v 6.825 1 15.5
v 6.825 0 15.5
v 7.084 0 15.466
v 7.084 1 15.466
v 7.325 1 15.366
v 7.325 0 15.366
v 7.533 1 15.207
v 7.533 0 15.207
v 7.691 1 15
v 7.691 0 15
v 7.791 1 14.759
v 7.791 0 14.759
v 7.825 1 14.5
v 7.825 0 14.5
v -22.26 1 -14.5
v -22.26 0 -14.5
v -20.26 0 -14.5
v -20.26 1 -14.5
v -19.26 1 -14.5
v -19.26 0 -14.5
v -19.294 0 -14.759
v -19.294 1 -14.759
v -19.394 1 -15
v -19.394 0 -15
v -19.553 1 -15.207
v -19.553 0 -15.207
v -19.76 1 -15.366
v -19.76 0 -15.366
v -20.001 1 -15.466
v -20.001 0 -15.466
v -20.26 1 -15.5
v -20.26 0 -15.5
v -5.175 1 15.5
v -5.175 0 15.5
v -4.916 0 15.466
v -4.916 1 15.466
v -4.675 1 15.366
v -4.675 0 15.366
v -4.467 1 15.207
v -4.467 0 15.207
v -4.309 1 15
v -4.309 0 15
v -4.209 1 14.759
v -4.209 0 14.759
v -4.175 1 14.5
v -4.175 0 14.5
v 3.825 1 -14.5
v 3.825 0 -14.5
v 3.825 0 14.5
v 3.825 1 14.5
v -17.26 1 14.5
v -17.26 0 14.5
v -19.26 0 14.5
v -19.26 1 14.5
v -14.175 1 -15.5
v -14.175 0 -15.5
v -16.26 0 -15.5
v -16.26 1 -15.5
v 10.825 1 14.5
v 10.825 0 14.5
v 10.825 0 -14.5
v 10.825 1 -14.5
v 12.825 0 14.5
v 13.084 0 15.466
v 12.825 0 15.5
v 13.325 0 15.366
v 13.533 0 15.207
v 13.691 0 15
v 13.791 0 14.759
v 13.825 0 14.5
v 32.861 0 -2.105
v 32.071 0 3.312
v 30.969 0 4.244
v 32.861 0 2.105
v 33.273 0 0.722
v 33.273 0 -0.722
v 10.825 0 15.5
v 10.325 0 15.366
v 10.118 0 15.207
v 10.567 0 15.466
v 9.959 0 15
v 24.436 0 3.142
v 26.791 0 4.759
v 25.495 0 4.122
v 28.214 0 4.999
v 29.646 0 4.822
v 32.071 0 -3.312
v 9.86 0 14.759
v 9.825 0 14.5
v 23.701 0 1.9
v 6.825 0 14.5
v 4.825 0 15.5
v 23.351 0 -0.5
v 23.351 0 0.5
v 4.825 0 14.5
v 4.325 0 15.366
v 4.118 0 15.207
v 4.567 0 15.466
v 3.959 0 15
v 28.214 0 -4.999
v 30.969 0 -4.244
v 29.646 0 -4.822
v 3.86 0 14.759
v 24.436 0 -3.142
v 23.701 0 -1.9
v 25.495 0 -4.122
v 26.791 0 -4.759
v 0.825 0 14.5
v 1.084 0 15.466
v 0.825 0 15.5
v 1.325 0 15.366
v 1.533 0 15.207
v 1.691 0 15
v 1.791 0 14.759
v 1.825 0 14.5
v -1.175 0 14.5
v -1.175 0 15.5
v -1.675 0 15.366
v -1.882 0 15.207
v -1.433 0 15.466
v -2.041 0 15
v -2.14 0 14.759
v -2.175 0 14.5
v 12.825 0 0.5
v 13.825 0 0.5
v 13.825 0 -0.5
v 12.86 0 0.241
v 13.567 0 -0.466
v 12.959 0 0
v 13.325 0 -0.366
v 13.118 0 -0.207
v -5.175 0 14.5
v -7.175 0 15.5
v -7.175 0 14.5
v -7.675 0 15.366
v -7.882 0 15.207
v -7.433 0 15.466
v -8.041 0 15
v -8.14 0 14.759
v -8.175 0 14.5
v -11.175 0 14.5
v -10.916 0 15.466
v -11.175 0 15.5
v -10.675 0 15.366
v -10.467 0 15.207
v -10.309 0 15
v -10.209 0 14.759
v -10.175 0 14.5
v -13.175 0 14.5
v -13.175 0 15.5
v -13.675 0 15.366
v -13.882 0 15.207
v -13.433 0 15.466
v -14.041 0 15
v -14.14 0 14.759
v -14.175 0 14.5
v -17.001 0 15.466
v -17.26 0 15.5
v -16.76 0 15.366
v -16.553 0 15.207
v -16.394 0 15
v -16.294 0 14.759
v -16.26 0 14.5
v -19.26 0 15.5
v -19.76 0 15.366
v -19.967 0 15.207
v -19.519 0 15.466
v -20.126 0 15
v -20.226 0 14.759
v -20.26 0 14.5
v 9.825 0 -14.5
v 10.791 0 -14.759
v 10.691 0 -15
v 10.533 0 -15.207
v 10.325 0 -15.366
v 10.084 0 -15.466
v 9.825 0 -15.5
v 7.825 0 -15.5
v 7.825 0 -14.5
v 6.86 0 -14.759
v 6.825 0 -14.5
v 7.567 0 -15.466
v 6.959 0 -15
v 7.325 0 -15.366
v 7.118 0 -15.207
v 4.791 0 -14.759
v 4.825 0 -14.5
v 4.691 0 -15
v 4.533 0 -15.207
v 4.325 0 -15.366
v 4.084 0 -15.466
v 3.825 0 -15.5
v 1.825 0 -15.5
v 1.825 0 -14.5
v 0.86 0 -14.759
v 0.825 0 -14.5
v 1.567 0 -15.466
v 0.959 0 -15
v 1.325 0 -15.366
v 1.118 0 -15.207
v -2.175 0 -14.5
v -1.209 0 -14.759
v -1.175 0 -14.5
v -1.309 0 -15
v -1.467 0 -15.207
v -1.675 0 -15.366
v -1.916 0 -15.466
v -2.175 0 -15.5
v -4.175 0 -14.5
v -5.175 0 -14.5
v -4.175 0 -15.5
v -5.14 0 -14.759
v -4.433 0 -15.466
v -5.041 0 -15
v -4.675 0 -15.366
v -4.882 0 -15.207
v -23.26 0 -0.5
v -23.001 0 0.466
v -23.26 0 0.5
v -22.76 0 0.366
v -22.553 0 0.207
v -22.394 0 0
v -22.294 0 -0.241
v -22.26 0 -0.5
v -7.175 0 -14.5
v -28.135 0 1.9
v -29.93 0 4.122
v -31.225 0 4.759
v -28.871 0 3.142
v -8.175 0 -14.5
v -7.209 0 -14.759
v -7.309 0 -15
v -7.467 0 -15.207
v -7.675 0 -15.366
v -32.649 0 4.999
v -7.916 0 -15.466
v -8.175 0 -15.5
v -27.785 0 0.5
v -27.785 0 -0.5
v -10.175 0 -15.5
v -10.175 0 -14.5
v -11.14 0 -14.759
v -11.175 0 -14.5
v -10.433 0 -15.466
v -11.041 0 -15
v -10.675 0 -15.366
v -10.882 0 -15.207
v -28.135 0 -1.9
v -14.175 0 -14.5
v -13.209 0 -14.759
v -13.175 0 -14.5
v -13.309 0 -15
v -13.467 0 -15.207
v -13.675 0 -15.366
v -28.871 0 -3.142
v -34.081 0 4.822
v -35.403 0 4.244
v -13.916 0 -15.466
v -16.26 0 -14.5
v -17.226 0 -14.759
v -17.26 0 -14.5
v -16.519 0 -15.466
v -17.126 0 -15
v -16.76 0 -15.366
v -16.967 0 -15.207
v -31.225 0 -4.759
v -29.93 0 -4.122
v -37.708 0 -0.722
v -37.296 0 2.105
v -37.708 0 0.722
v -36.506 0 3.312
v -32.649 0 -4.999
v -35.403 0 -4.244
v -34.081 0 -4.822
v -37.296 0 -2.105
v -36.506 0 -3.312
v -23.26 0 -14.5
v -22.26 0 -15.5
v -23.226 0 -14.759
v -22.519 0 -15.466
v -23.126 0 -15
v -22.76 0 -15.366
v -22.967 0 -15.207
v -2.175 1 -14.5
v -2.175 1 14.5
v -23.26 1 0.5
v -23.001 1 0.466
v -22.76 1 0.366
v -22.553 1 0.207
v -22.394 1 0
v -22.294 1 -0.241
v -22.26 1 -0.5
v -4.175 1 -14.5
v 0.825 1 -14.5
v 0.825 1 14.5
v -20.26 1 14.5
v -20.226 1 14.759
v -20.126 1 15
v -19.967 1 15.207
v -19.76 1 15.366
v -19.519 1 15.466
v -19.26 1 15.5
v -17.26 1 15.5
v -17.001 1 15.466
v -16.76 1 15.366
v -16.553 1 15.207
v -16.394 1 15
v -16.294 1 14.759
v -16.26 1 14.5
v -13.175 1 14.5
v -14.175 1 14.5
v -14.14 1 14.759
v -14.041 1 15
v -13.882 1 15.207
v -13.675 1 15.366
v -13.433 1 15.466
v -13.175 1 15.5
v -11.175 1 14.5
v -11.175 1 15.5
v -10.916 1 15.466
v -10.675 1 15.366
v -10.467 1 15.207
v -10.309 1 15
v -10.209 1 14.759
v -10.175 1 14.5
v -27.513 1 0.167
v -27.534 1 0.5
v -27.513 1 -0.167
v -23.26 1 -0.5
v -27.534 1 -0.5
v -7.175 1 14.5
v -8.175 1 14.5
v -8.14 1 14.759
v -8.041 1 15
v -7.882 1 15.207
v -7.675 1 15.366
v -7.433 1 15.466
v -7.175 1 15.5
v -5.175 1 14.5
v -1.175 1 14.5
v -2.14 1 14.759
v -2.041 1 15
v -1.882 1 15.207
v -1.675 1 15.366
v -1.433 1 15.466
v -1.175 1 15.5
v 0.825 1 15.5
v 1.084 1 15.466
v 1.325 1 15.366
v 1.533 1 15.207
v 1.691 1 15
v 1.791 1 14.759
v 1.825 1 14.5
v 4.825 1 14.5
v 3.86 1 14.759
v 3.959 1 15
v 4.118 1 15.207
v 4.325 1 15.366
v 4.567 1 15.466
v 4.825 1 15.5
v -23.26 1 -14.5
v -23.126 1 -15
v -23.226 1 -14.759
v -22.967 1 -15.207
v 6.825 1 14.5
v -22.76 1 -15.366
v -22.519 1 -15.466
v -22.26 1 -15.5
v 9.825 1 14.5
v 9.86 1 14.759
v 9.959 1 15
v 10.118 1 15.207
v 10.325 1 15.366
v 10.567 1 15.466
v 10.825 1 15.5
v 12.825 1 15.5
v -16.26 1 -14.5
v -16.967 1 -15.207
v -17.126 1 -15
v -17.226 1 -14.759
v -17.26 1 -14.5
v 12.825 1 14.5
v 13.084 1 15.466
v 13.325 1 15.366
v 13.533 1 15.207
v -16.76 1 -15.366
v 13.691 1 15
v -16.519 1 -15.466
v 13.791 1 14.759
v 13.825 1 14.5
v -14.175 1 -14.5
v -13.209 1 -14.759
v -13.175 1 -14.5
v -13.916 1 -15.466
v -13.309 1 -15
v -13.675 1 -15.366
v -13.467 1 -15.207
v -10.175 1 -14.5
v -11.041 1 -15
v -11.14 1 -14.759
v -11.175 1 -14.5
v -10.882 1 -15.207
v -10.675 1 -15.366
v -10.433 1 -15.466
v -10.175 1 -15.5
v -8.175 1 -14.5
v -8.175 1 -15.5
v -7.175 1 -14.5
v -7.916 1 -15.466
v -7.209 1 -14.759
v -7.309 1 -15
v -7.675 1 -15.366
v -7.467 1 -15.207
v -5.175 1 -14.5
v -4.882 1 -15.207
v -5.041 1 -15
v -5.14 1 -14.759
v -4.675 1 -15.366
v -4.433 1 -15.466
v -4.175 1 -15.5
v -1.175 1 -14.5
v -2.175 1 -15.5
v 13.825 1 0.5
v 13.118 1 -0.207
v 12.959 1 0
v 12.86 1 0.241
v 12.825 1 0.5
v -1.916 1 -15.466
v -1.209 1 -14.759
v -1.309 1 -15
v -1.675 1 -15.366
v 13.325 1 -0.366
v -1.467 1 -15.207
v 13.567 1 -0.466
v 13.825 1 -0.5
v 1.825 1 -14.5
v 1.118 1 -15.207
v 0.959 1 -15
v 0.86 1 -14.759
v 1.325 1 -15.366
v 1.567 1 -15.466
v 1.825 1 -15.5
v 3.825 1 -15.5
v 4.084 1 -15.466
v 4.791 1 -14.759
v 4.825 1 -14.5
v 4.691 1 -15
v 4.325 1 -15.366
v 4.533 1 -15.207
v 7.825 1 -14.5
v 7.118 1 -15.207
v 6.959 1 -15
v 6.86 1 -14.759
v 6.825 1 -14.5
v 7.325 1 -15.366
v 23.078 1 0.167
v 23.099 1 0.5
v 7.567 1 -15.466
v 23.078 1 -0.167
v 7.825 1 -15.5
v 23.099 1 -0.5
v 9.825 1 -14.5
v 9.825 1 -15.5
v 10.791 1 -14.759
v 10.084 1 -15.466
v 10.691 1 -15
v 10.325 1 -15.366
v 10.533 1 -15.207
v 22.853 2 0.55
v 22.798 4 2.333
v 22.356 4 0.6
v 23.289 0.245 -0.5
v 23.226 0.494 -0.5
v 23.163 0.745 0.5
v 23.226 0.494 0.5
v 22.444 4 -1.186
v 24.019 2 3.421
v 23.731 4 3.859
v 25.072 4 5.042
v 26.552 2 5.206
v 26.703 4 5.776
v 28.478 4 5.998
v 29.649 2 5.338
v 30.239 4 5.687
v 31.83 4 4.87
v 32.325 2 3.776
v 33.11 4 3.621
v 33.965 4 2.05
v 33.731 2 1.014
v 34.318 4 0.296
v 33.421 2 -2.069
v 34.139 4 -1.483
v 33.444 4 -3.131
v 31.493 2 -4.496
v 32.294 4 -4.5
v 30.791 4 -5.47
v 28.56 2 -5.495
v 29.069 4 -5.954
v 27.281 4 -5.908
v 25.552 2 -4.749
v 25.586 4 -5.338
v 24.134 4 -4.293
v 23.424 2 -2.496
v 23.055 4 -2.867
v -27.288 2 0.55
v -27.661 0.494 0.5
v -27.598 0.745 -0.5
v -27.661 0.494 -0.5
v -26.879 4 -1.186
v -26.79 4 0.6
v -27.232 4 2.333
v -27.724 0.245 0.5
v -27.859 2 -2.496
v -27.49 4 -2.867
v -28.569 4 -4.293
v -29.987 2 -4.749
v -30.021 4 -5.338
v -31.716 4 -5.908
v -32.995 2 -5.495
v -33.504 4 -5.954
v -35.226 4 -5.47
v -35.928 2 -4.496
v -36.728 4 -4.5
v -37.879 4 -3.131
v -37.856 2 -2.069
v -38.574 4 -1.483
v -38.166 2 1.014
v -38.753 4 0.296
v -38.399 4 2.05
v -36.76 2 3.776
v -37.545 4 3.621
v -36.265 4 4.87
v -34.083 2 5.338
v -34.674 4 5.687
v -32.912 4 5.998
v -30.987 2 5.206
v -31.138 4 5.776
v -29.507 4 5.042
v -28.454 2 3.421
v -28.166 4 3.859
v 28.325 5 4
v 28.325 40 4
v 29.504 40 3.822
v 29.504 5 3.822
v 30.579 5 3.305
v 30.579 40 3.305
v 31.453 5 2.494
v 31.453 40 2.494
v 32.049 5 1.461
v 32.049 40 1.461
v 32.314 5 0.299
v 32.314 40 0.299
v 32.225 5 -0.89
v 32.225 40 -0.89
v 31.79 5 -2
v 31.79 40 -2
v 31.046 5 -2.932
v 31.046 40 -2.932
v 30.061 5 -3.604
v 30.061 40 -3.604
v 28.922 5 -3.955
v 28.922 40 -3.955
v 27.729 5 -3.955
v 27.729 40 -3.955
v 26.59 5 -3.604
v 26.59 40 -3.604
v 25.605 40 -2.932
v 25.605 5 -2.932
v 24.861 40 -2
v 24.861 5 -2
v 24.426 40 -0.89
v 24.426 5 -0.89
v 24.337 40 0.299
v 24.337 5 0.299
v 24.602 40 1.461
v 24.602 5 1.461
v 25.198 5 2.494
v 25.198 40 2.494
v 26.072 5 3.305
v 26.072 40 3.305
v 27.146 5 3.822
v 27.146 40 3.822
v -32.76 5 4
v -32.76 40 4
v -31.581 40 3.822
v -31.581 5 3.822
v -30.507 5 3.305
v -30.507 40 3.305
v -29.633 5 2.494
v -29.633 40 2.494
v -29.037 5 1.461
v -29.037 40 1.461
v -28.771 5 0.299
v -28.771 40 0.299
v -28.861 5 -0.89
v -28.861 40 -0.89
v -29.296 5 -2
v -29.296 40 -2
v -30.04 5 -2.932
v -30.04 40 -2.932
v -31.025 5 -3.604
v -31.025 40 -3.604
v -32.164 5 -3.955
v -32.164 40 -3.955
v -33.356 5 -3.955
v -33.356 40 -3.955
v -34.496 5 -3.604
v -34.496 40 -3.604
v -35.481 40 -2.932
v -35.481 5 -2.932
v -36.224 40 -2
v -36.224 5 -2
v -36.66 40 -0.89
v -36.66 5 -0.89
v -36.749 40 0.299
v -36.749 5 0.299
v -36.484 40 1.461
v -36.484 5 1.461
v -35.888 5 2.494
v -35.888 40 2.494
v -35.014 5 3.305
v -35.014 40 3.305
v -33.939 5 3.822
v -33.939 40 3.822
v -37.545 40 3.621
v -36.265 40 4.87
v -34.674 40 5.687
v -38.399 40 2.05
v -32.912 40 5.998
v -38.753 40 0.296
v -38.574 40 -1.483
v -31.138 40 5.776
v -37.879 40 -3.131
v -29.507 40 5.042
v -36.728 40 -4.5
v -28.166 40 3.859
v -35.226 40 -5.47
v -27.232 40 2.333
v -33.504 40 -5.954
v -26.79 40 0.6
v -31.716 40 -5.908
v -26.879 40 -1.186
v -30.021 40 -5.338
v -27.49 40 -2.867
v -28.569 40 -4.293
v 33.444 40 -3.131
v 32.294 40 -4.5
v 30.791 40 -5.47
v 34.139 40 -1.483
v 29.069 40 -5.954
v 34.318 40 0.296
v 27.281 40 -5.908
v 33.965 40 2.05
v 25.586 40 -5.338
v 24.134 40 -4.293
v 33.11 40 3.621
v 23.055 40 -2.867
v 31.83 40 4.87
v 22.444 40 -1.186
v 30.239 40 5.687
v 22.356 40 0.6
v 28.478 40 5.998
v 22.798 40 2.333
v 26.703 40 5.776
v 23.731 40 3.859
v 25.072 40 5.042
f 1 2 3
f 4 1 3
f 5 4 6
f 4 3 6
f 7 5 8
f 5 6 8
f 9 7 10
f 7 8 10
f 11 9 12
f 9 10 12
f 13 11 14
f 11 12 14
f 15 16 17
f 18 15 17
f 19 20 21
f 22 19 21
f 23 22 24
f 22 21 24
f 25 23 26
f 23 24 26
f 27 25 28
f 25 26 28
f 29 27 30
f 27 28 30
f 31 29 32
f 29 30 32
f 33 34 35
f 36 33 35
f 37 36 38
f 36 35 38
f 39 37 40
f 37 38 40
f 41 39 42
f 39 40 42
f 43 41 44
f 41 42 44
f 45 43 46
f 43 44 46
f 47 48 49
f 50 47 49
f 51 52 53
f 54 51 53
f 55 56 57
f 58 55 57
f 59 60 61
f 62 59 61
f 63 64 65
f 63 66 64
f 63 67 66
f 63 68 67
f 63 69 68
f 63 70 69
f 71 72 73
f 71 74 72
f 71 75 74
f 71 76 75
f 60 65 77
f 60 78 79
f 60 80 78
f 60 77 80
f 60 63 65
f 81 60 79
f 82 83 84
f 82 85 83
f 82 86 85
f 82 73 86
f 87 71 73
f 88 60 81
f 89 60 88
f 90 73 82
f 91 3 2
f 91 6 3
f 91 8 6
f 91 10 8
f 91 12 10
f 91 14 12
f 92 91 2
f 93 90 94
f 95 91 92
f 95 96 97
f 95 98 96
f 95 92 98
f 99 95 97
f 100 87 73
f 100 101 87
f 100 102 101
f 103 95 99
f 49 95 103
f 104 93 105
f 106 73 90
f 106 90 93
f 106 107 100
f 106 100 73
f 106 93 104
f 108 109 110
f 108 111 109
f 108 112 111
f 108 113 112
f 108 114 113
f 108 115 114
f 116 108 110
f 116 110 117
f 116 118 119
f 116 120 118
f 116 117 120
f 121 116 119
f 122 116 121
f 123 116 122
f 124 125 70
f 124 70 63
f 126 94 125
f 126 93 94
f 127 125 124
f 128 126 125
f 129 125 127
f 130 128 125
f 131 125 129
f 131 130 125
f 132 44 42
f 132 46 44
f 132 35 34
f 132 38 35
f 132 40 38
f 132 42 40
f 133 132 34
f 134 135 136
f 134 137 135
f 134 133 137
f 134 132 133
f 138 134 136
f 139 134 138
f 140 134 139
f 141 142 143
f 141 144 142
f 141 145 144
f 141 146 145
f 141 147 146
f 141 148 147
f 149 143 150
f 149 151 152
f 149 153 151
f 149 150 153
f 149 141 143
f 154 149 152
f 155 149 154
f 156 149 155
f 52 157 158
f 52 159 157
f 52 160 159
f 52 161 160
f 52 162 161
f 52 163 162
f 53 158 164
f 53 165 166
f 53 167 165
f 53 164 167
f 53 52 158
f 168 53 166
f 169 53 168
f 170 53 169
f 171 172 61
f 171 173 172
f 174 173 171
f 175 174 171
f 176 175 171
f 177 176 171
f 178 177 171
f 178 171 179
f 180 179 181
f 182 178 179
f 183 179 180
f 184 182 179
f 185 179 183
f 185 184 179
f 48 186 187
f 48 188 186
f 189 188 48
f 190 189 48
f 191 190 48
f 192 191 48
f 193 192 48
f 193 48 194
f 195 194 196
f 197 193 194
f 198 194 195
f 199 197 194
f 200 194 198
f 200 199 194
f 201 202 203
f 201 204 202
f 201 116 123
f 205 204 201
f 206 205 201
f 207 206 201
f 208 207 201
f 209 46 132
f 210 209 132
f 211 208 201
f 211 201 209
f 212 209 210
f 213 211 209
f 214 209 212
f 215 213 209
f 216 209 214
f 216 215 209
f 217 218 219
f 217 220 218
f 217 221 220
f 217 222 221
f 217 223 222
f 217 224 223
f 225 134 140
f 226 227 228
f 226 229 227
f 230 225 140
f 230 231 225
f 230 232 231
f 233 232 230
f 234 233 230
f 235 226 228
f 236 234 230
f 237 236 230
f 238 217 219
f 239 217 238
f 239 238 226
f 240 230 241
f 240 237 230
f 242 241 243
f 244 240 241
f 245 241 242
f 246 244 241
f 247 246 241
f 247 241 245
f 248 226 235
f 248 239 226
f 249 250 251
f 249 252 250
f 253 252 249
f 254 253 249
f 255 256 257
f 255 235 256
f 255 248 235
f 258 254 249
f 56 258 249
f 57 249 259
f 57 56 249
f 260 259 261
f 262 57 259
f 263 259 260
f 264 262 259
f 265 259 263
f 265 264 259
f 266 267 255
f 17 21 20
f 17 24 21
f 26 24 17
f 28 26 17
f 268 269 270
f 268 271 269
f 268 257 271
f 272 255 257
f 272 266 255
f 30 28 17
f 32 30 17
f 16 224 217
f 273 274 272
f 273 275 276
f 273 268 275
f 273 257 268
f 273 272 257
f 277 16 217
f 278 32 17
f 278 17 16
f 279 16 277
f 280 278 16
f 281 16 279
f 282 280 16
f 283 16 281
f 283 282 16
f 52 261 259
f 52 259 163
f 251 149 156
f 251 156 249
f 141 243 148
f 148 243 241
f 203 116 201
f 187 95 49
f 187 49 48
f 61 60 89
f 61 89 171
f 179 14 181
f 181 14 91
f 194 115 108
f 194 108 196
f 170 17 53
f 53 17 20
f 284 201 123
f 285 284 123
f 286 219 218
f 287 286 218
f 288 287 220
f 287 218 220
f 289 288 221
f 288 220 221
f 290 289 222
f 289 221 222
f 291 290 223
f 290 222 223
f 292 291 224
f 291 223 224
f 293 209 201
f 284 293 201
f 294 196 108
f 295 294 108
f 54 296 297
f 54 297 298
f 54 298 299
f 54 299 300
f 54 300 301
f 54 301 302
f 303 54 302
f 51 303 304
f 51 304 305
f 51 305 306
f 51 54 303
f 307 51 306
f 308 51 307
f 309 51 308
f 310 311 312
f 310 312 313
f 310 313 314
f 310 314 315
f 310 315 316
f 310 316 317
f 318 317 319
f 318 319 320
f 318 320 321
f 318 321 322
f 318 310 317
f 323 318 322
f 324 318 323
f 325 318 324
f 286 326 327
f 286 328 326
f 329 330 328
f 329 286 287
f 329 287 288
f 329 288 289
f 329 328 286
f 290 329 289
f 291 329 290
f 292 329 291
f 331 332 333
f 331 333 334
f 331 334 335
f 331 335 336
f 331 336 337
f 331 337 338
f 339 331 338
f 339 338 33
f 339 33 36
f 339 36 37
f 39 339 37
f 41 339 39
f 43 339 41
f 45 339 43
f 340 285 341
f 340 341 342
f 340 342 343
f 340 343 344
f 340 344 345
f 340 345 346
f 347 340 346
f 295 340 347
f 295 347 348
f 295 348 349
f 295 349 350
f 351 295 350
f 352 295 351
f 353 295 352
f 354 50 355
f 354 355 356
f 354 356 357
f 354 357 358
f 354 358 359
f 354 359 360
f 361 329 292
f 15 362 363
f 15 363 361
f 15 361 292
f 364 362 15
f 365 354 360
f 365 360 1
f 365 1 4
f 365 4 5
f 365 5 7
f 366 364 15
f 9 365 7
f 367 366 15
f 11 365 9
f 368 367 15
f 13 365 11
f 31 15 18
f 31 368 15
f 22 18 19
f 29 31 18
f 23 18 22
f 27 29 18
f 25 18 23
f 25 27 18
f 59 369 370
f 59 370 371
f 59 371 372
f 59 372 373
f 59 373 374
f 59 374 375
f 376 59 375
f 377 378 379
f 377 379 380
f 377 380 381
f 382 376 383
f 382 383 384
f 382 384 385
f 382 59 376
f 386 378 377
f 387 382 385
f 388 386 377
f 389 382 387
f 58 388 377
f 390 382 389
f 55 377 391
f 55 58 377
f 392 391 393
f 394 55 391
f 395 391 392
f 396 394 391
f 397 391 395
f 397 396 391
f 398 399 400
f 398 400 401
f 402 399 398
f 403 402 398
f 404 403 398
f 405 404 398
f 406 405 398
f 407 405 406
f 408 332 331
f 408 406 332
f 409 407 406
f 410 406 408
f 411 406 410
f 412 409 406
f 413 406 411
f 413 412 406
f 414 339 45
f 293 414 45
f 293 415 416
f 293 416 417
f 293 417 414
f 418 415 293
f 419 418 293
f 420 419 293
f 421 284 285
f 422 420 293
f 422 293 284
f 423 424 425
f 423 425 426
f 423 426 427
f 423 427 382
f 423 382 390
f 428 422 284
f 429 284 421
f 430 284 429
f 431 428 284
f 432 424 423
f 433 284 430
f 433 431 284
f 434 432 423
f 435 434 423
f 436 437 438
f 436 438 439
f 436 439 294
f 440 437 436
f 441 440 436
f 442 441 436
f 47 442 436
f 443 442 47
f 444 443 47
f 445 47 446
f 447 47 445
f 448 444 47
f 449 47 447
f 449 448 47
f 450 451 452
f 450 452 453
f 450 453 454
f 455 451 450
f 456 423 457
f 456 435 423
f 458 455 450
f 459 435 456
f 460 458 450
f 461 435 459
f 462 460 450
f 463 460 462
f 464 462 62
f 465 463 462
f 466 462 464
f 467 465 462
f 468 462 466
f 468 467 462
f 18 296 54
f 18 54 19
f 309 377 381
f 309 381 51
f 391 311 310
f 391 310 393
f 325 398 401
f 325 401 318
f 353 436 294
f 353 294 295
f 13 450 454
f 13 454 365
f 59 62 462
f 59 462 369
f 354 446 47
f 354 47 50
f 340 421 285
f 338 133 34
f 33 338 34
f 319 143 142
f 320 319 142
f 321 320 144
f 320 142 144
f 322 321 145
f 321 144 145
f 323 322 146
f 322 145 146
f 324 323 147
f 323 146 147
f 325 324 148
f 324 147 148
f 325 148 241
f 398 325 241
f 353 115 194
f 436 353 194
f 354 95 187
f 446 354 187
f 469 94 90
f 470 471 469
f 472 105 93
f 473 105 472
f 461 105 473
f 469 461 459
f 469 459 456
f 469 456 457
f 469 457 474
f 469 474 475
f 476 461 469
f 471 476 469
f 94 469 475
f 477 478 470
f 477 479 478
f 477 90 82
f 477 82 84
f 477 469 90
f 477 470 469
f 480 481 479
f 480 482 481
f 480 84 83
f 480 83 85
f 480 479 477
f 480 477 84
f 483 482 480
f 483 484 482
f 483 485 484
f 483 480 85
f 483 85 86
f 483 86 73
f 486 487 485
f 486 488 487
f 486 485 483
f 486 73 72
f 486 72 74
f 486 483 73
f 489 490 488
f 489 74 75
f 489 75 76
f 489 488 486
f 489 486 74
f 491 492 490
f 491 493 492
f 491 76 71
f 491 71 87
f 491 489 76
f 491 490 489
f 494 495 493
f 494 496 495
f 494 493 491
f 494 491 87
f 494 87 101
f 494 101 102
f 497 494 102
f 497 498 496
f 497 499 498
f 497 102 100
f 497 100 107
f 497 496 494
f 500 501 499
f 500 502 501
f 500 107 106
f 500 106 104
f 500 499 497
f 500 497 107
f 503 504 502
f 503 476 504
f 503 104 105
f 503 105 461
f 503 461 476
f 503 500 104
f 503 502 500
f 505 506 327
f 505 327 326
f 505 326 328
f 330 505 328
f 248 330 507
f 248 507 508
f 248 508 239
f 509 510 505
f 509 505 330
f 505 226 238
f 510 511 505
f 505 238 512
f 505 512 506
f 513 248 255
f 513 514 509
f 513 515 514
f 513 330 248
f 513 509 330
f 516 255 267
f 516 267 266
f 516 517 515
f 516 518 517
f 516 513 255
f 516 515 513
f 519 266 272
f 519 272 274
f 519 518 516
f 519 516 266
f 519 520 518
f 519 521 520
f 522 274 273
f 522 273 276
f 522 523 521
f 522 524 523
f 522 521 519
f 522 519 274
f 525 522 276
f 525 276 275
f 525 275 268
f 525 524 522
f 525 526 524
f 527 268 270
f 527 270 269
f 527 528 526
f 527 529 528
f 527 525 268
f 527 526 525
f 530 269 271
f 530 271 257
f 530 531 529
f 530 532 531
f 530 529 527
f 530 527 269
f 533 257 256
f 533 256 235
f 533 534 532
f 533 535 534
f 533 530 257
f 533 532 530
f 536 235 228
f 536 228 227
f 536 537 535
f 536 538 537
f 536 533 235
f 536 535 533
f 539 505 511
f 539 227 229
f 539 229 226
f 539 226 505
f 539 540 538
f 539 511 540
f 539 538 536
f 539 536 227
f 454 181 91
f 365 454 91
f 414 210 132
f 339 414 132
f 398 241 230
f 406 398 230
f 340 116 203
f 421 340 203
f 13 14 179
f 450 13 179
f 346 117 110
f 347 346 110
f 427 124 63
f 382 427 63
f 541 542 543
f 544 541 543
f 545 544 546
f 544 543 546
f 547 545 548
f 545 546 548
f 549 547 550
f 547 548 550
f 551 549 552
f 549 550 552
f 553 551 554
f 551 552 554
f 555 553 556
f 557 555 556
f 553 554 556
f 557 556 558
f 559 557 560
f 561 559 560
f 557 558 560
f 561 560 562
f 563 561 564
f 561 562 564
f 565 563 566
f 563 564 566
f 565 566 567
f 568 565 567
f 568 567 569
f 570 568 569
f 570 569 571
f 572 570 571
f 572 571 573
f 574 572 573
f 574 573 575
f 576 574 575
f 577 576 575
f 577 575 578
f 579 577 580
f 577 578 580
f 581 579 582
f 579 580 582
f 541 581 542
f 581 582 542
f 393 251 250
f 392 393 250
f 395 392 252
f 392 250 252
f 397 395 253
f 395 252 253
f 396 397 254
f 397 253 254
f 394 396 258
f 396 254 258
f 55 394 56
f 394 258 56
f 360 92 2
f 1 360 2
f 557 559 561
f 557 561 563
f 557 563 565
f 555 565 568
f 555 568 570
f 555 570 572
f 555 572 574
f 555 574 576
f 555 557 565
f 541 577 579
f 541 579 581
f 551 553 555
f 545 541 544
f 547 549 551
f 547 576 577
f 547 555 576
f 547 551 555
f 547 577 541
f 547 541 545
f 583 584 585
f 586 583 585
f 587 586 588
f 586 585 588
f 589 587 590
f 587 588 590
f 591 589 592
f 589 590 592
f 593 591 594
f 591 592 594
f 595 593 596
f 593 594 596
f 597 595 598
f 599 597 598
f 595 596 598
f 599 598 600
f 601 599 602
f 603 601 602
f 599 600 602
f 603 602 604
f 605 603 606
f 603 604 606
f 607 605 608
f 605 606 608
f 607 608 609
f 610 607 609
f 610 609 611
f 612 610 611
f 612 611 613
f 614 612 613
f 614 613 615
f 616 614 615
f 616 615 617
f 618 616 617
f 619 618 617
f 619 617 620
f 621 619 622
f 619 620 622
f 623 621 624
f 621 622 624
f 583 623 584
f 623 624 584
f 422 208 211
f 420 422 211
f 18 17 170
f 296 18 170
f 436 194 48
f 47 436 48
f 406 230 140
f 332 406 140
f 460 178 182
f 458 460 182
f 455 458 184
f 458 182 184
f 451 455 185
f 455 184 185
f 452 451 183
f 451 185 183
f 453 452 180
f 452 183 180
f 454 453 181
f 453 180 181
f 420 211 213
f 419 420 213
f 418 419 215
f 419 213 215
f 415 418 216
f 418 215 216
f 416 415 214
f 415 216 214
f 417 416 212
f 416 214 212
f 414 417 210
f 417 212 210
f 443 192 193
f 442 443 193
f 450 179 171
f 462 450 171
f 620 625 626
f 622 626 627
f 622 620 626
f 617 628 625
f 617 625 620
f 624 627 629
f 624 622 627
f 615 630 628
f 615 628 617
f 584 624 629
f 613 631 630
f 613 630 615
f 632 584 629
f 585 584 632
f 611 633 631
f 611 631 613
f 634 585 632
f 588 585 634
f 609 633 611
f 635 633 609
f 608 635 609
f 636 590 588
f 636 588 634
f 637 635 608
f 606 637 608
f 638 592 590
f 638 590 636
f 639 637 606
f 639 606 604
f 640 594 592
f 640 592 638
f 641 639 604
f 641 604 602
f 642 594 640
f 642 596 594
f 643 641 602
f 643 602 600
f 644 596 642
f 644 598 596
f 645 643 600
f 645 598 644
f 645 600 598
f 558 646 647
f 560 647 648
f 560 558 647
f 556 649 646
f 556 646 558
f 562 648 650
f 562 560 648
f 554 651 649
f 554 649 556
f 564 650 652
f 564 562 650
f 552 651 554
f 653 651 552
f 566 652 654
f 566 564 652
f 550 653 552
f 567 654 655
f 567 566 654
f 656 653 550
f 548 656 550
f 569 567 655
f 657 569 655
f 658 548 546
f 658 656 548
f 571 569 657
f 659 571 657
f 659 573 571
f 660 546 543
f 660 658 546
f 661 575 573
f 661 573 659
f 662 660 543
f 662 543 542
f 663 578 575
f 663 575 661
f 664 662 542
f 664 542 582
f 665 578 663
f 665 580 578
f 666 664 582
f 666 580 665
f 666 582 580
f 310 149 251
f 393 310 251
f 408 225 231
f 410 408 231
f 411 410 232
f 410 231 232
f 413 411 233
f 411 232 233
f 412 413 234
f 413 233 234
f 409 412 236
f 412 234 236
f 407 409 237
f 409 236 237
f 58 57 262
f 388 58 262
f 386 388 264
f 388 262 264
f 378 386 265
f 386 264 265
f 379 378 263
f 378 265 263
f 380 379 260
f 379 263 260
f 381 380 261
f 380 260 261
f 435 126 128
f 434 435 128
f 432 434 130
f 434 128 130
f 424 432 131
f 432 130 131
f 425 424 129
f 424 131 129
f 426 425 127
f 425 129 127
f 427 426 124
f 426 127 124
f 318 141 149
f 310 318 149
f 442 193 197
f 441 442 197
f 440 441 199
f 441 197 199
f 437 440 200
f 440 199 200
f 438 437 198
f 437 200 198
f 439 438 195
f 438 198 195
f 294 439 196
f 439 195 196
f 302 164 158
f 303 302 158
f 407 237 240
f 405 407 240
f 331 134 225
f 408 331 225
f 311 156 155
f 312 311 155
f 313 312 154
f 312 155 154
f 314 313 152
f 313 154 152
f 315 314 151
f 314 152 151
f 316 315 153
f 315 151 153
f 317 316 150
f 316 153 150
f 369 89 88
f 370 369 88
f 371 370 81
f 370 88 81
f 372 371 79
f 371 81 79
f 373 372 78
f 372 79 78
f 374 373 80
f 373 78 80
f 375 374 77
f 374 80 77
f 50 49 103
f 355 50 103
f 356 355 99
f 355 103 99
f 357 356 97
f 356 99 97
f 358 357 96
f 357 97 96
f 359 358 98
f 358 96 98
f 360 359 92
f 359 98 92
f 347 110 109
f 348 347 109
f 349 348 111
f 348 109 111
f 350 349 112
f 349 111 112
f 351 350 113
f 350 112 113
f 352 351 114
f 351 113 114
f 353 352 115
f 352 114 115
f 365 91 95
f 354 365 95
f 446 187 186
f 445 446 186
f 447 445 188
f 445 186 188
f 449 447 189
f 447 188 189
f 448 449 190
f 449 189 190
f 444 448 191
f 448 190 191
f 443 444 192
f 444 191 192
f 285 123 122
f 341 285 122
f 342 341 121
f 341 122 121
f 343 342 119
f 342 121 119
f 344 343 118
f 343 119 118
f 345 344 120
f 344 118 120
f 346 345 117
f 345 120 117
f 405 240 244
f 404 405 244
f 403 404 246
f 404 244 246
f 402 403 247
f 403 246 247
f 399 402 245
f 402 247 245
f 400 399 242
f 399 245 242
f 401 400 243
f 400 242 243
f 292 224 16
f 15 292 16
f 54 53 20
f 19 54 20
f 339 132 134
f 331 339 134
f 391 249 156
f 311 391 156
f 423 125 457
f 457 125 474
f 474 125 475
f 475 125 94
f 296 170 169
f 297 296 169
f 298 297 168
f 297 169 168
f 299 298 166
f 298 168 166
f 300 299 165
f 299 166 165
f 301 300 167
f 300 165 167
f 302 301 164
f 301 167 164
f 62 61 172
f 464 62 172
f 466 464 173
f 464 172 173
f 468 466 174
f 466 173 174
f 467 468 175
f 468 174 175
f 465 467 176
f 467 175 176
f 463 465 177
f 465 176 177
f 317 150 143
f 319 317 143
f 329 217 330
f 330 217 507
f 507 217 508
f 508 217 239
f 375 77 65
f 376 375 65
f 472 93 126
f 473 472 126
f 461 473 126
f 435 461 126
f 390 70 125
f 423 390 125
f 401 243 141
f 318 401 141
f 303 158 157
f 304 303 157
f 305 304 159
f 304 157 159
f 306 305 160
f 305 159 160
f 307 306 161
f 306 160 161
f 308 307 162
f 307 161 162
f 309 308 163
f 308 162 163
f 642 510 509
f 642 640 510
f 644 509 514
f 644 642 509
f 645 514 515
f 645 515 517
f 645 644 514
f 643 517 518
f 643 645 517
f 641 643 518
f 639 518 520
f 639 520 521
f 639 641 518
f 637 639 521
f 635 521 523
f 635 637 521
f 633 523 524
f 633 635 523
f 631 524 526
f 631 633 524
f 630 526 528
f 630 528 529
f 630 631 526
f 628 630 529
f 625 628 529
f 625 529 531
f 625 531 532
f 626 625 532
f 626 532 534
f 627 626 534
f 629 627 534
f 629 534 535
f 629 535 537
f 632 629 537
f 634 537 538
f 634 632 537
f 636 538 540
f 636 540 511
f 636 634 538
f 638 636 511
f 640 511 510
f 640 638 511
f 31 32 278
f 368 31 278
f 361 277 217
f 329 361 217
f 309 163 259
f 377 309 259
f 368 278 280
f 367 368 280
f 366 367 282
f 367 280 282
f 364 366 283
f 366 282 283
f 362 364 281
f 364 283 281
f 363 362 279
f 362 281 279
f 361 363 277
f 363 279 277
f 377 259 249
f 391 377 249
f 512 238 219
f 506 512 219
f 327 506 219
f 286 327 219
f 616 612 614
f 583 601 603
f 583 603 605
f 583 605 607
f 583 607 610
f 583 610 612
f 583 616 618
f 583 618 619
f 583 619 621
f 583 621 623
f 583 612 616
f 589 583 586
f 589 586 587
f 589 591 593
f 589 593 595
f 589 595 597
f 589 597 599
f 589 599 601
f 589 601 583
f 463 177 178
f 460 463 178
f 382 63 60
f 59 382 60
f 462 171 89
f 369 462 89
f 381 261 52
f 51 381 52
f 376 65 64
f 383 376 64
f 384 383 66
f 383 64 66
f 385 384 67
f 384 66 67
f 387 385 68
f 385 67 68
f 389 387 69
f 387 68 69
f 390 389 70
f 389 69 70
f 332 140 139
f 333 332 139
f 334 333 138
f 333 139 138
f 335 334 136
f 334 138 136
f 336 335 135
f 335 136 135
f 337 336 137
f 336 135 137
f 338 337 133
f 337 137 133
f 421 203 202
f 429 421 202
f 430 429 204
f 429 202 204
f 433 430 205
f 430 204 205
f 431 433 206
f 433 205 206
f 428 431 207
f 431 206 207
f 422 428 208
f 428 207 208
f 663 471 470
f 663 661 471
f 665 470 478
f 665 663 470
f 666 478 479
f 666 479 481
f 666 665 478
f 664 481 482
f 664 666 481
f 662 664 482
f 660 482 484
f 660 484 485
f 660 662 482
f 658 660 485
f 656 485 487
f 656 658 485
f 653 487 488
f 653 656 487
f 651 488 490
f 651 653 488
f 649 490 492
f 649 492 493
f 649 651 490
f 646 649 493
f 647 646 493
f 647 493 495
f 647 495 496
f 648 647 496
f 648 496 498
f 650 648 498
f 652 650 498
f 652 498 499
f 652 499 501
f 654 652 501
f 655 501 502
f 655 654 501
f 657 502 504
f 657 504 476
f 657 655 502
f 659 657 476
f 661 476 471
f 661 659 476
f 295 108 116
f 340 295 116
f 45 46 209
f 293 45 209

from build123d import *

# Parameters (mm, degrees)
BOSS_EXTRUDE1_DEPTH = 1
SKETCH5_R           = 4
CUT_EXTRUDE1_DEPTH  = 35


with BuildPart() as part:
    # Sketch2 → Boss-Extrude1 (new body)
    with BuildSketch(Plane(origin=(0, 0, 0), x_dir=(1, 0, 0), z_dir=(0, 1, 0))):
        with BuildLine():
            Line((-32.760220782, -0.5), (-23.260220782, -0.5))
            ThreePointArc((-23.260220782, -0.5), (-22.553114001, -0.207106781), (-22.260220782, 0.5))
            Line((-22.260220782, 0.5), (-22.260220782, 14.5))
            Line((-22.260220782, 14.5), (-20.260220782, 14.5))
            Line((-20.260220782, 14.5), (-20.260220782, 0))
            Line((-20.260220782, 0), (-20.260220782, -14.5))
            ThreePointArc((-20.260220782, -14.5), (-19.967327563, -15.207106781), (-19.260220782, -15.5))
            Line((-19.260220782, -15.5), (-17.260220782, -15.5))
            ThreePointArc((-17.260220782, -15.5), (-16.553114001, -15.207106781), (-16.260220782, -14.5))
            Line((-16.260220782, -14.5), (-16.260220782, 0))
            Line((-16.260220782, 0), (-16.260220782, 14.5))
            Line((-16.260220782, 14.5), (-14.174535805, 14.5))
            Line((-14.174535805, 14.5), (-14.174535805, -14.5))
            ThreePointArc((-14.174535805, -14.5), (-13.881642586, -15.207106781), (-13.174535805, -15.5))
            Line((-13.174535805, -15.5), (-11.174535805, -15.5))
            ThreePointArc((-11.174535805, -15.5), (-10.467429024, -15.207106781), (-10.174535805, -14.5))
            Line((-10.174535805, -14.5), (-10.174535805, 14.5))
            Line((-10.174535805, 14.5), (-8.174535805, 14.5))
            Line((-8.174535805, 14.5), (-8.174535805, -14.5))
            ThreePointArc((-8.174535805, -14.5), (-7.881642586, -15.207106781), (-7.174535805, -15.5))
            Line((-7.174535805, -15.5), (-5.174535805, -15.5))
            ThreePointArc((-5.174535805, -15.5), (-4.467429024, -15.207106781), (-4.174535805, -14.5))
            Line((-4.174535805, -14.5), (-4.174535805, 14.5))
            Line((-4.174535805, 14.5), (-2.174535805, 14.5))
            Line((-2.174535805, 14.5), (-2.174535805, -14.5))
            ThreePointArc((-2.174535805, -14.5), (-1.881642586, -15.207106781), (-1.174535805, -15.5))
            Line((-1.174535805, -15.5), (0.825464195, -15.5))
            ThreePointArc((0.825464195, -15.5), (1.532570976, -15.207106781), (1.825464195, -14.5))
            Line((1.825464195, -14.5), (1.825464195, 14.5))
            Line((1.825464195, 14.5), (3.825464195, 14.5))
            Line((3.825464195, 14.5), (3.825464195, -14.5))
            ThreePointArc((3.825464195, -14.5), (4.118357414, -15.207106781), (4.825464195, -15.5))
            Line((4.825464195, -15.5), (6.825464195, -15.5))
            ThreePointArc((6.825464195, -15.5), (7.532570976, -15.207106781), (7.825464195, -14.5))
            Line((7.825464195, -14.5), (7.825464195, 14.5))
            Line((7.825464195, 14.5), (9.825464195, 14.5))
            Line((9.825464195, 14.5), (9.825464195, -14.5))
            ThreePointArc((9.825464195, -14.5), (10.118357414, -15.207106781), (10.825464195, -15.5))
            Line((10.825464195, -15.5), (12.825464195, -15.5))
            ThreePointArc((12.825464195, -15.5), (13.532570976, -15.207106781), (13.825464195, -14.5))
            Line((13.825464195, -14.5), (13.825464195, -0.5))
            Line((13.825464195, -0.5), (28.325464195, -0.5))
            ThreePointArc((28.325464195, -0.5), (28.825464195, 0), (28.325464195, 0.5))
            Line((28.325464195, 0.5), (13.825464195, 0.5))
            ThreePointArc((13.825464195, 0.5), (13.118357414, 0.207106781), (12.825464195, -0.5))
            Line((12.825464195, -0.5), (12.825464195, -14.5))
            Line((12.825464195, -14.5), (10.825464195, -14.5))
            Line((10.825464195, -14.5), (10.825464195, 14.5))
            ThreePointArc((10.825464195, 14.5), (10.532570976, 15.207106781), (9.825464195, 15.5))
            Line((9.825464195, 15.5), (7.825464195, 15.5))
            ThreePointArc((7.825464195, 15.5), (7.118357414, 15.207106781), (6.825464195, 14.5))
            Line((6.825464195, 14.5), (6.825464195, -14.5))
            Line((6.825464195, -14.5), (4.825464195, -14.5))
            Line((4.825464195, -14.5), (4.825464195, 14.5))
            ThreePointArc((4.825464195, 14.5), (4.532570976, 15.207106781), (3.825464195, 15.5))
            Line((3.825464195, 15.5), (1.825464195, 15.5))
            ThreePointArc((1.825464195, 15.5), (1.118357414, 15.207106781), (0.825464195, 14.5))
            Line((0.825464195, 14.5), (0.825464195, -14.5))
            Line((0.825464195, -14.5), (-1.174535805, -14.5))
            Line((-1.174535805, -14.5), (-1.174535805, 14.5))
            ThreePointArc((-1.174535805, 14.5), (-1.467429024, 15.207106781), (-2.174535805, 15.5))
            Line((-2.174535805, 15.5), (-4.174535805, 15.5))
            ThreePointArc((-4.174535805, 15.5), (-4.881642586, 15.207106781), (-5.174535805, 14.5))
            Line((-5.174535805, 14.5), (-5.174535805, -14.5))
            Line((-5.174535805, -14.5), (-7.174535805, -14.5))
            Line((-7.174535805, -14.5), (-7.174535805, 14.5))
            ThreePointArc((-7.174535805, 14.5), (-7.467429024, 15.207106781), (-8.174535805, 15.5))
            Line((-8.174535805, 15.5), (-10.174535805, 15.5))
            ThreePointArc((-10.174535805, 15.5), (-10.881642586, 15.207106781), (-11.174535805, 14.5))
            Line((-11.174535805, 14.5), (-11.174535805, -14.5))
            Line((-11.174535805, -14.5), (-13.174535805, -14.5))
            Line((-13.174535805, -14.5), (-13.174535805, 14.5))
            ThreePointArc((-13.174535805, 14.5), (-13.467429024, 15.207106781), (-14.174535805, 15.5))
            Line((-14.174535805, 15.5), (-16.260220782, 15.5))
            ThreePointArc((-16.260220782, 15.5), (-16.967327563, 15.207106781), (-17.260220782, 14.5))
            Line((-17.260220782, 14.5), (-17.260220782, 0))
            Line((-17.260220782, 0), (-17.260220782, -14.5))
            Line((-17.260220782, -14.5), (-19.260220782, -14.5))
            Line((-19.260220782, -14.5), (-19.260220782, 0))
            Line((-19.260220782, 0), (-19.260220782, 14.5))
            ThreePointArc((-19.260220782, 14.5), (-19.553114001, 15.207106781), (-20.260220782, 15.5))
            Line((-20.260220782, 15.5), (-22.260220782, 15.5))
            ThreePointArc((-22.260220782, 15.5), (-22.967327563, 15.207106781), (-23.260220782, 14.5))
            Line((-23.260220782, 14.5), (-23.260220782, 0.5))
            Line((-23.260220782, 0.5), (-32.760220782, 0.5))
            ThreePointArc((-32.760220782, 0.5), (-33.260220782, 0), (-32.760220782, -0.5))
        make_face()
    extrude(amount=BOSS_EXTRUDE1_DEPTH)

    # Sketch3 → Revolve1 (revolve)
    with BuildSketch(Plane.XY, mode=Mode.PRIVATE) as revolve1_sk:
        Polygon((-32.760220782, 0), (-37.760220782, 0), (-38.760220782, 4), (-38.760220782, 40), (-32.760220782, 40), align=None)
    revolve(revolve1_sk.sketch.rotate(Axis((-32.760220782, 0, 0), (0, 1, 0)), 174.260829523), axis=Axis((-32.760220782, 0, 0), (0, 1, 0)))

    # Sketch4 → Revolve2 (revolve)
    with BuildSketch(Plane.XY, mode=Mode.PRIVATE) as revolve2_sk:
        Polygon((28.325464195, 0), (33.325464195, 0), (34.325464195, 4), (34.325464195, 40), (28.325464195, 40), align=None)
    revolve(revolve2_sk.sketch.rotate(Axis((28.325464195, 0, 0), (0, 1, 0)), 185.739170027), axis=Axis((28.325464195, 0, 0), (0, 1, 0)))

    # Sketch5 → Cut-Extrude1 (cut)
    with BuildSketch(Plane(origin=(0, 40, 0), x_dir=(1, 0, 0), z_dir=(0, 1, 0))):
        with Locations(Location((-32.760220782, 0, 0), (0, 0, 270))):
            Circle(SKETCH5_R)
        with Locations(Location((28.325464195, 0, 0), (0, 0, 270))):
            Circle(SKETCH5_R)
    extrude(amount=-CUT_EXTRUDE1_DEPTH, mode=Mode.SUBTRACT)


solid = part.part
